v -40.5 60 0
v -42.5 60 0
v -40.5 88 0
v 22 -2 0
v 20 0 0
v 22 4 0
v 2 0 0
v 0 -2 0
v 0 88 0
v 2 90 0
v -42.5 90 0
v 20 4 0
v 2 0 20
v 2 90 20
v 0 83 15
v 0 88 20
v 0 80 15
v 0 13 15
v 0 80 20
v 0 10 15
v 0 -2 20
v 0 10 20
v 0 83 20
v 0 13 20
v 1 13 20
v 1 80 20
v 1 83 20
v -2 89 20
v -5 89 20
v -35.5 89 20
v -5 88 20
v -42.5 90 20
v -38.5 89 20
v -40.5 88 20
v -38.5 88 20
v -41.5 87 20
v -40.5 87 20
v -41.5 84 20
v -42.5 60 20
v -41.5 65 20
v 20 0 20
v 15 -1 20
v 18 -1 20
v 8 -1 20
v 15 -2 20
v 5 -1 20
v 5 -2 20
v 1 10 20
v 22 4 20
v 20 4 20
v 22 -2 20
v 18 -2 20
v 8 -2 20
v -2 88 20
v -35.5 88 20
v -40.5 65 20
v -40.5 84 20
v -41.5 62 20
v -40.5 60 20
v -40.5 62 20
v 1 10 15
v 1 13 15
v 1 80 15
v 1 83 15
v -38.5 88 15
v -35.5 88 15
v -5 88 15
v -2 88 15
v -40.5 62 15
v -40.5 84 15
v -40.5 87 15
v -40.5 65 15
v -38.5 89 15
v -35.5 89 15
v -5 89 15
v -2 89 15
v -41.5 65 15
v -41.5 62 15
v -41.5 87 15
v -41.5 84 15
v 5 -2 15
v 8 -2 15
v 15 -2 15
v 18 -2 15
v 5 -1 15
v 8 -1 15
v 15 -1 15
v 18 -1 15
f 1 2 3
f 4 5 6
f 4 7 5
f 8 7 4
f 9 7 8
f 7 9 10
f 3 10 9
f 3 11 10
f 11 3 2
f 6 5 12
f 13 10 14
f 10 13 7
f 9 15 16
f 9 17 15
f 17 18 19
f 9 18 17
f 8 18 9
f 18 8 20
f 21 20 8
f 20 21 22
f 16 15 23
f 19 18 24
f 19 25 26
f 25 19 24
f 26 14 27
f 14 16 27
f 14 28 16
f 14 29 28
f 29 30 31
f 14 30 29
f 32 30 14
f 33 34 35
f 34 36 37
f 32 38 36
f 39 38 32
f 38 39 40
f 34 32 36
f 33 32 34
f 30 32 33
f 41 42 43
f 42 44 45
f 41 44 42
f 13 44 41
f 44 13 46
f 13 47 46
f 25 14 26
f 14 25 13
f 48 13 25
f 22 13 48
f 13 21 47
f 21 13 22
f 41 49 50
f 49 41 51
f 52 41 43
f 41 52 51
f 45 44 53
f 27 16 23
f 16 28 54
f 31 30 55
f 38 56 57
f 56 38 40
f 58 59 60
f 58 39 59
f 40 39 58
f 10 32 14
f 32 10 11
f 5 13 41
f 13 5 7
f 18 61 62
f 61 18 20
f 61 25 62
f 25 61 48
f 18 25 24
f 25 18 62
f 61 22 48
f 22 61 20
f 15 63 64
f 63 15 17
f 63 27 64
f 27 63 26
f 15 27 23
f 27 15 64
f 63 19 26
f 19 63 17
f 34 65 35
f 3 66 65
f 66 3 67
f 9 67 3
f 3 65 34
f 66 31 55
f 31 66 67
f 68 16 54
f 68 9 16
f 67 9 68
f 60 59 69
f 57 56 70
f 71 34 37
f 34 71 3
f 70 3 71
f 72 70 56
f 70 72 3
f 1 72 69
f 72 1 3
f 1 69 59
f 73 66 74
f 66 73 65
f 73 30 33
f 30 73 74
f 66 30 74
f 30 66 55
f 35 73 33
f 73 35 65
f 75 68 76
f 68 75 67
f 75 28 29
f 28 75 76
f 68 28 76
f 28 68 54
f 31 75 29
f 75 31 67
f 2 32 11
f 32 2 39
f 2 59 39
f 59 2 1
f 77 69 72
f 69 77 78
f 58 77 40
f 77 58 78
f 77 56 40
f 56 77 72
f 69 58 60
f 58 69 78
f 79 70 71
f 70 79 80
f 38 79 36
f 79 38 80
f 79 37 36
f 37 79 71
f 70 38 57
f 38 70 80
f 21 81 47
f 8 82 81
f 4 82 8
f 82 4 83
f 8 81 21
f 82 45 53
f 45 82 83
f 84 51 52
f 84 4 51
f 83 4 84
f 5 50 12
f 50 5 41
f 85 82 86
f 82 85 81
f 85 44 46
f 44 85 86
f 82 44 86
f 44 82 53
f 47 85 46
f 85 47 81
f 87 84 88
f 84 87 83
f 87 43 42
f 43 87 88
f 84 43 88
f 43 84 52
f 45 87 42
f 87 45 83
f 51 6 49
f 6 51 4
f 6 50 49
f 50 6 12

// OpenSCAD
translate([0, 0, 20]) {
    rotate([0, 90, 0]){
    //main plate
    difference() {
        cube([20, 90, 2]);
        translate([0, 10, 0]) cube([5, 3, 1]);
        translate([0, 80, 0]) cube([5, 3, 1]);
    }

    //top connector
    translate([0, 90, -40.5])
        rotate([90, 0, 0])
            difference() {
                cube([20, 40.5, 2]);
                translate([0, 2, 1]) cube([5, 3, 1]);
                translate([0, 35.5, 1]) cube([5, 3, 1]);
            }
            
    //back clip        
    translate([0, 60, -42.5])
        difference() {
            cube([20, 30, 2]);
            translate([0, 2, 1]) cube([5, 3, 1]);
            translate([0, 24, 1]) cube([5, 3, 1]);
         }
        
        
    //bottom bracket
    //translate([0, 90, 0])
        rotate([90, 0, 0])
            difference() {
                cube([20, 20, 2]);
                translate([0, 5, 1]) cube([5, 3, 1]);
                translate([0, 15, 1]) cube([5, 3, 1]);
            }

    //bottom lip
    translate([0, -2, 20])
        cube([20, 6, 2]);
    }
}
